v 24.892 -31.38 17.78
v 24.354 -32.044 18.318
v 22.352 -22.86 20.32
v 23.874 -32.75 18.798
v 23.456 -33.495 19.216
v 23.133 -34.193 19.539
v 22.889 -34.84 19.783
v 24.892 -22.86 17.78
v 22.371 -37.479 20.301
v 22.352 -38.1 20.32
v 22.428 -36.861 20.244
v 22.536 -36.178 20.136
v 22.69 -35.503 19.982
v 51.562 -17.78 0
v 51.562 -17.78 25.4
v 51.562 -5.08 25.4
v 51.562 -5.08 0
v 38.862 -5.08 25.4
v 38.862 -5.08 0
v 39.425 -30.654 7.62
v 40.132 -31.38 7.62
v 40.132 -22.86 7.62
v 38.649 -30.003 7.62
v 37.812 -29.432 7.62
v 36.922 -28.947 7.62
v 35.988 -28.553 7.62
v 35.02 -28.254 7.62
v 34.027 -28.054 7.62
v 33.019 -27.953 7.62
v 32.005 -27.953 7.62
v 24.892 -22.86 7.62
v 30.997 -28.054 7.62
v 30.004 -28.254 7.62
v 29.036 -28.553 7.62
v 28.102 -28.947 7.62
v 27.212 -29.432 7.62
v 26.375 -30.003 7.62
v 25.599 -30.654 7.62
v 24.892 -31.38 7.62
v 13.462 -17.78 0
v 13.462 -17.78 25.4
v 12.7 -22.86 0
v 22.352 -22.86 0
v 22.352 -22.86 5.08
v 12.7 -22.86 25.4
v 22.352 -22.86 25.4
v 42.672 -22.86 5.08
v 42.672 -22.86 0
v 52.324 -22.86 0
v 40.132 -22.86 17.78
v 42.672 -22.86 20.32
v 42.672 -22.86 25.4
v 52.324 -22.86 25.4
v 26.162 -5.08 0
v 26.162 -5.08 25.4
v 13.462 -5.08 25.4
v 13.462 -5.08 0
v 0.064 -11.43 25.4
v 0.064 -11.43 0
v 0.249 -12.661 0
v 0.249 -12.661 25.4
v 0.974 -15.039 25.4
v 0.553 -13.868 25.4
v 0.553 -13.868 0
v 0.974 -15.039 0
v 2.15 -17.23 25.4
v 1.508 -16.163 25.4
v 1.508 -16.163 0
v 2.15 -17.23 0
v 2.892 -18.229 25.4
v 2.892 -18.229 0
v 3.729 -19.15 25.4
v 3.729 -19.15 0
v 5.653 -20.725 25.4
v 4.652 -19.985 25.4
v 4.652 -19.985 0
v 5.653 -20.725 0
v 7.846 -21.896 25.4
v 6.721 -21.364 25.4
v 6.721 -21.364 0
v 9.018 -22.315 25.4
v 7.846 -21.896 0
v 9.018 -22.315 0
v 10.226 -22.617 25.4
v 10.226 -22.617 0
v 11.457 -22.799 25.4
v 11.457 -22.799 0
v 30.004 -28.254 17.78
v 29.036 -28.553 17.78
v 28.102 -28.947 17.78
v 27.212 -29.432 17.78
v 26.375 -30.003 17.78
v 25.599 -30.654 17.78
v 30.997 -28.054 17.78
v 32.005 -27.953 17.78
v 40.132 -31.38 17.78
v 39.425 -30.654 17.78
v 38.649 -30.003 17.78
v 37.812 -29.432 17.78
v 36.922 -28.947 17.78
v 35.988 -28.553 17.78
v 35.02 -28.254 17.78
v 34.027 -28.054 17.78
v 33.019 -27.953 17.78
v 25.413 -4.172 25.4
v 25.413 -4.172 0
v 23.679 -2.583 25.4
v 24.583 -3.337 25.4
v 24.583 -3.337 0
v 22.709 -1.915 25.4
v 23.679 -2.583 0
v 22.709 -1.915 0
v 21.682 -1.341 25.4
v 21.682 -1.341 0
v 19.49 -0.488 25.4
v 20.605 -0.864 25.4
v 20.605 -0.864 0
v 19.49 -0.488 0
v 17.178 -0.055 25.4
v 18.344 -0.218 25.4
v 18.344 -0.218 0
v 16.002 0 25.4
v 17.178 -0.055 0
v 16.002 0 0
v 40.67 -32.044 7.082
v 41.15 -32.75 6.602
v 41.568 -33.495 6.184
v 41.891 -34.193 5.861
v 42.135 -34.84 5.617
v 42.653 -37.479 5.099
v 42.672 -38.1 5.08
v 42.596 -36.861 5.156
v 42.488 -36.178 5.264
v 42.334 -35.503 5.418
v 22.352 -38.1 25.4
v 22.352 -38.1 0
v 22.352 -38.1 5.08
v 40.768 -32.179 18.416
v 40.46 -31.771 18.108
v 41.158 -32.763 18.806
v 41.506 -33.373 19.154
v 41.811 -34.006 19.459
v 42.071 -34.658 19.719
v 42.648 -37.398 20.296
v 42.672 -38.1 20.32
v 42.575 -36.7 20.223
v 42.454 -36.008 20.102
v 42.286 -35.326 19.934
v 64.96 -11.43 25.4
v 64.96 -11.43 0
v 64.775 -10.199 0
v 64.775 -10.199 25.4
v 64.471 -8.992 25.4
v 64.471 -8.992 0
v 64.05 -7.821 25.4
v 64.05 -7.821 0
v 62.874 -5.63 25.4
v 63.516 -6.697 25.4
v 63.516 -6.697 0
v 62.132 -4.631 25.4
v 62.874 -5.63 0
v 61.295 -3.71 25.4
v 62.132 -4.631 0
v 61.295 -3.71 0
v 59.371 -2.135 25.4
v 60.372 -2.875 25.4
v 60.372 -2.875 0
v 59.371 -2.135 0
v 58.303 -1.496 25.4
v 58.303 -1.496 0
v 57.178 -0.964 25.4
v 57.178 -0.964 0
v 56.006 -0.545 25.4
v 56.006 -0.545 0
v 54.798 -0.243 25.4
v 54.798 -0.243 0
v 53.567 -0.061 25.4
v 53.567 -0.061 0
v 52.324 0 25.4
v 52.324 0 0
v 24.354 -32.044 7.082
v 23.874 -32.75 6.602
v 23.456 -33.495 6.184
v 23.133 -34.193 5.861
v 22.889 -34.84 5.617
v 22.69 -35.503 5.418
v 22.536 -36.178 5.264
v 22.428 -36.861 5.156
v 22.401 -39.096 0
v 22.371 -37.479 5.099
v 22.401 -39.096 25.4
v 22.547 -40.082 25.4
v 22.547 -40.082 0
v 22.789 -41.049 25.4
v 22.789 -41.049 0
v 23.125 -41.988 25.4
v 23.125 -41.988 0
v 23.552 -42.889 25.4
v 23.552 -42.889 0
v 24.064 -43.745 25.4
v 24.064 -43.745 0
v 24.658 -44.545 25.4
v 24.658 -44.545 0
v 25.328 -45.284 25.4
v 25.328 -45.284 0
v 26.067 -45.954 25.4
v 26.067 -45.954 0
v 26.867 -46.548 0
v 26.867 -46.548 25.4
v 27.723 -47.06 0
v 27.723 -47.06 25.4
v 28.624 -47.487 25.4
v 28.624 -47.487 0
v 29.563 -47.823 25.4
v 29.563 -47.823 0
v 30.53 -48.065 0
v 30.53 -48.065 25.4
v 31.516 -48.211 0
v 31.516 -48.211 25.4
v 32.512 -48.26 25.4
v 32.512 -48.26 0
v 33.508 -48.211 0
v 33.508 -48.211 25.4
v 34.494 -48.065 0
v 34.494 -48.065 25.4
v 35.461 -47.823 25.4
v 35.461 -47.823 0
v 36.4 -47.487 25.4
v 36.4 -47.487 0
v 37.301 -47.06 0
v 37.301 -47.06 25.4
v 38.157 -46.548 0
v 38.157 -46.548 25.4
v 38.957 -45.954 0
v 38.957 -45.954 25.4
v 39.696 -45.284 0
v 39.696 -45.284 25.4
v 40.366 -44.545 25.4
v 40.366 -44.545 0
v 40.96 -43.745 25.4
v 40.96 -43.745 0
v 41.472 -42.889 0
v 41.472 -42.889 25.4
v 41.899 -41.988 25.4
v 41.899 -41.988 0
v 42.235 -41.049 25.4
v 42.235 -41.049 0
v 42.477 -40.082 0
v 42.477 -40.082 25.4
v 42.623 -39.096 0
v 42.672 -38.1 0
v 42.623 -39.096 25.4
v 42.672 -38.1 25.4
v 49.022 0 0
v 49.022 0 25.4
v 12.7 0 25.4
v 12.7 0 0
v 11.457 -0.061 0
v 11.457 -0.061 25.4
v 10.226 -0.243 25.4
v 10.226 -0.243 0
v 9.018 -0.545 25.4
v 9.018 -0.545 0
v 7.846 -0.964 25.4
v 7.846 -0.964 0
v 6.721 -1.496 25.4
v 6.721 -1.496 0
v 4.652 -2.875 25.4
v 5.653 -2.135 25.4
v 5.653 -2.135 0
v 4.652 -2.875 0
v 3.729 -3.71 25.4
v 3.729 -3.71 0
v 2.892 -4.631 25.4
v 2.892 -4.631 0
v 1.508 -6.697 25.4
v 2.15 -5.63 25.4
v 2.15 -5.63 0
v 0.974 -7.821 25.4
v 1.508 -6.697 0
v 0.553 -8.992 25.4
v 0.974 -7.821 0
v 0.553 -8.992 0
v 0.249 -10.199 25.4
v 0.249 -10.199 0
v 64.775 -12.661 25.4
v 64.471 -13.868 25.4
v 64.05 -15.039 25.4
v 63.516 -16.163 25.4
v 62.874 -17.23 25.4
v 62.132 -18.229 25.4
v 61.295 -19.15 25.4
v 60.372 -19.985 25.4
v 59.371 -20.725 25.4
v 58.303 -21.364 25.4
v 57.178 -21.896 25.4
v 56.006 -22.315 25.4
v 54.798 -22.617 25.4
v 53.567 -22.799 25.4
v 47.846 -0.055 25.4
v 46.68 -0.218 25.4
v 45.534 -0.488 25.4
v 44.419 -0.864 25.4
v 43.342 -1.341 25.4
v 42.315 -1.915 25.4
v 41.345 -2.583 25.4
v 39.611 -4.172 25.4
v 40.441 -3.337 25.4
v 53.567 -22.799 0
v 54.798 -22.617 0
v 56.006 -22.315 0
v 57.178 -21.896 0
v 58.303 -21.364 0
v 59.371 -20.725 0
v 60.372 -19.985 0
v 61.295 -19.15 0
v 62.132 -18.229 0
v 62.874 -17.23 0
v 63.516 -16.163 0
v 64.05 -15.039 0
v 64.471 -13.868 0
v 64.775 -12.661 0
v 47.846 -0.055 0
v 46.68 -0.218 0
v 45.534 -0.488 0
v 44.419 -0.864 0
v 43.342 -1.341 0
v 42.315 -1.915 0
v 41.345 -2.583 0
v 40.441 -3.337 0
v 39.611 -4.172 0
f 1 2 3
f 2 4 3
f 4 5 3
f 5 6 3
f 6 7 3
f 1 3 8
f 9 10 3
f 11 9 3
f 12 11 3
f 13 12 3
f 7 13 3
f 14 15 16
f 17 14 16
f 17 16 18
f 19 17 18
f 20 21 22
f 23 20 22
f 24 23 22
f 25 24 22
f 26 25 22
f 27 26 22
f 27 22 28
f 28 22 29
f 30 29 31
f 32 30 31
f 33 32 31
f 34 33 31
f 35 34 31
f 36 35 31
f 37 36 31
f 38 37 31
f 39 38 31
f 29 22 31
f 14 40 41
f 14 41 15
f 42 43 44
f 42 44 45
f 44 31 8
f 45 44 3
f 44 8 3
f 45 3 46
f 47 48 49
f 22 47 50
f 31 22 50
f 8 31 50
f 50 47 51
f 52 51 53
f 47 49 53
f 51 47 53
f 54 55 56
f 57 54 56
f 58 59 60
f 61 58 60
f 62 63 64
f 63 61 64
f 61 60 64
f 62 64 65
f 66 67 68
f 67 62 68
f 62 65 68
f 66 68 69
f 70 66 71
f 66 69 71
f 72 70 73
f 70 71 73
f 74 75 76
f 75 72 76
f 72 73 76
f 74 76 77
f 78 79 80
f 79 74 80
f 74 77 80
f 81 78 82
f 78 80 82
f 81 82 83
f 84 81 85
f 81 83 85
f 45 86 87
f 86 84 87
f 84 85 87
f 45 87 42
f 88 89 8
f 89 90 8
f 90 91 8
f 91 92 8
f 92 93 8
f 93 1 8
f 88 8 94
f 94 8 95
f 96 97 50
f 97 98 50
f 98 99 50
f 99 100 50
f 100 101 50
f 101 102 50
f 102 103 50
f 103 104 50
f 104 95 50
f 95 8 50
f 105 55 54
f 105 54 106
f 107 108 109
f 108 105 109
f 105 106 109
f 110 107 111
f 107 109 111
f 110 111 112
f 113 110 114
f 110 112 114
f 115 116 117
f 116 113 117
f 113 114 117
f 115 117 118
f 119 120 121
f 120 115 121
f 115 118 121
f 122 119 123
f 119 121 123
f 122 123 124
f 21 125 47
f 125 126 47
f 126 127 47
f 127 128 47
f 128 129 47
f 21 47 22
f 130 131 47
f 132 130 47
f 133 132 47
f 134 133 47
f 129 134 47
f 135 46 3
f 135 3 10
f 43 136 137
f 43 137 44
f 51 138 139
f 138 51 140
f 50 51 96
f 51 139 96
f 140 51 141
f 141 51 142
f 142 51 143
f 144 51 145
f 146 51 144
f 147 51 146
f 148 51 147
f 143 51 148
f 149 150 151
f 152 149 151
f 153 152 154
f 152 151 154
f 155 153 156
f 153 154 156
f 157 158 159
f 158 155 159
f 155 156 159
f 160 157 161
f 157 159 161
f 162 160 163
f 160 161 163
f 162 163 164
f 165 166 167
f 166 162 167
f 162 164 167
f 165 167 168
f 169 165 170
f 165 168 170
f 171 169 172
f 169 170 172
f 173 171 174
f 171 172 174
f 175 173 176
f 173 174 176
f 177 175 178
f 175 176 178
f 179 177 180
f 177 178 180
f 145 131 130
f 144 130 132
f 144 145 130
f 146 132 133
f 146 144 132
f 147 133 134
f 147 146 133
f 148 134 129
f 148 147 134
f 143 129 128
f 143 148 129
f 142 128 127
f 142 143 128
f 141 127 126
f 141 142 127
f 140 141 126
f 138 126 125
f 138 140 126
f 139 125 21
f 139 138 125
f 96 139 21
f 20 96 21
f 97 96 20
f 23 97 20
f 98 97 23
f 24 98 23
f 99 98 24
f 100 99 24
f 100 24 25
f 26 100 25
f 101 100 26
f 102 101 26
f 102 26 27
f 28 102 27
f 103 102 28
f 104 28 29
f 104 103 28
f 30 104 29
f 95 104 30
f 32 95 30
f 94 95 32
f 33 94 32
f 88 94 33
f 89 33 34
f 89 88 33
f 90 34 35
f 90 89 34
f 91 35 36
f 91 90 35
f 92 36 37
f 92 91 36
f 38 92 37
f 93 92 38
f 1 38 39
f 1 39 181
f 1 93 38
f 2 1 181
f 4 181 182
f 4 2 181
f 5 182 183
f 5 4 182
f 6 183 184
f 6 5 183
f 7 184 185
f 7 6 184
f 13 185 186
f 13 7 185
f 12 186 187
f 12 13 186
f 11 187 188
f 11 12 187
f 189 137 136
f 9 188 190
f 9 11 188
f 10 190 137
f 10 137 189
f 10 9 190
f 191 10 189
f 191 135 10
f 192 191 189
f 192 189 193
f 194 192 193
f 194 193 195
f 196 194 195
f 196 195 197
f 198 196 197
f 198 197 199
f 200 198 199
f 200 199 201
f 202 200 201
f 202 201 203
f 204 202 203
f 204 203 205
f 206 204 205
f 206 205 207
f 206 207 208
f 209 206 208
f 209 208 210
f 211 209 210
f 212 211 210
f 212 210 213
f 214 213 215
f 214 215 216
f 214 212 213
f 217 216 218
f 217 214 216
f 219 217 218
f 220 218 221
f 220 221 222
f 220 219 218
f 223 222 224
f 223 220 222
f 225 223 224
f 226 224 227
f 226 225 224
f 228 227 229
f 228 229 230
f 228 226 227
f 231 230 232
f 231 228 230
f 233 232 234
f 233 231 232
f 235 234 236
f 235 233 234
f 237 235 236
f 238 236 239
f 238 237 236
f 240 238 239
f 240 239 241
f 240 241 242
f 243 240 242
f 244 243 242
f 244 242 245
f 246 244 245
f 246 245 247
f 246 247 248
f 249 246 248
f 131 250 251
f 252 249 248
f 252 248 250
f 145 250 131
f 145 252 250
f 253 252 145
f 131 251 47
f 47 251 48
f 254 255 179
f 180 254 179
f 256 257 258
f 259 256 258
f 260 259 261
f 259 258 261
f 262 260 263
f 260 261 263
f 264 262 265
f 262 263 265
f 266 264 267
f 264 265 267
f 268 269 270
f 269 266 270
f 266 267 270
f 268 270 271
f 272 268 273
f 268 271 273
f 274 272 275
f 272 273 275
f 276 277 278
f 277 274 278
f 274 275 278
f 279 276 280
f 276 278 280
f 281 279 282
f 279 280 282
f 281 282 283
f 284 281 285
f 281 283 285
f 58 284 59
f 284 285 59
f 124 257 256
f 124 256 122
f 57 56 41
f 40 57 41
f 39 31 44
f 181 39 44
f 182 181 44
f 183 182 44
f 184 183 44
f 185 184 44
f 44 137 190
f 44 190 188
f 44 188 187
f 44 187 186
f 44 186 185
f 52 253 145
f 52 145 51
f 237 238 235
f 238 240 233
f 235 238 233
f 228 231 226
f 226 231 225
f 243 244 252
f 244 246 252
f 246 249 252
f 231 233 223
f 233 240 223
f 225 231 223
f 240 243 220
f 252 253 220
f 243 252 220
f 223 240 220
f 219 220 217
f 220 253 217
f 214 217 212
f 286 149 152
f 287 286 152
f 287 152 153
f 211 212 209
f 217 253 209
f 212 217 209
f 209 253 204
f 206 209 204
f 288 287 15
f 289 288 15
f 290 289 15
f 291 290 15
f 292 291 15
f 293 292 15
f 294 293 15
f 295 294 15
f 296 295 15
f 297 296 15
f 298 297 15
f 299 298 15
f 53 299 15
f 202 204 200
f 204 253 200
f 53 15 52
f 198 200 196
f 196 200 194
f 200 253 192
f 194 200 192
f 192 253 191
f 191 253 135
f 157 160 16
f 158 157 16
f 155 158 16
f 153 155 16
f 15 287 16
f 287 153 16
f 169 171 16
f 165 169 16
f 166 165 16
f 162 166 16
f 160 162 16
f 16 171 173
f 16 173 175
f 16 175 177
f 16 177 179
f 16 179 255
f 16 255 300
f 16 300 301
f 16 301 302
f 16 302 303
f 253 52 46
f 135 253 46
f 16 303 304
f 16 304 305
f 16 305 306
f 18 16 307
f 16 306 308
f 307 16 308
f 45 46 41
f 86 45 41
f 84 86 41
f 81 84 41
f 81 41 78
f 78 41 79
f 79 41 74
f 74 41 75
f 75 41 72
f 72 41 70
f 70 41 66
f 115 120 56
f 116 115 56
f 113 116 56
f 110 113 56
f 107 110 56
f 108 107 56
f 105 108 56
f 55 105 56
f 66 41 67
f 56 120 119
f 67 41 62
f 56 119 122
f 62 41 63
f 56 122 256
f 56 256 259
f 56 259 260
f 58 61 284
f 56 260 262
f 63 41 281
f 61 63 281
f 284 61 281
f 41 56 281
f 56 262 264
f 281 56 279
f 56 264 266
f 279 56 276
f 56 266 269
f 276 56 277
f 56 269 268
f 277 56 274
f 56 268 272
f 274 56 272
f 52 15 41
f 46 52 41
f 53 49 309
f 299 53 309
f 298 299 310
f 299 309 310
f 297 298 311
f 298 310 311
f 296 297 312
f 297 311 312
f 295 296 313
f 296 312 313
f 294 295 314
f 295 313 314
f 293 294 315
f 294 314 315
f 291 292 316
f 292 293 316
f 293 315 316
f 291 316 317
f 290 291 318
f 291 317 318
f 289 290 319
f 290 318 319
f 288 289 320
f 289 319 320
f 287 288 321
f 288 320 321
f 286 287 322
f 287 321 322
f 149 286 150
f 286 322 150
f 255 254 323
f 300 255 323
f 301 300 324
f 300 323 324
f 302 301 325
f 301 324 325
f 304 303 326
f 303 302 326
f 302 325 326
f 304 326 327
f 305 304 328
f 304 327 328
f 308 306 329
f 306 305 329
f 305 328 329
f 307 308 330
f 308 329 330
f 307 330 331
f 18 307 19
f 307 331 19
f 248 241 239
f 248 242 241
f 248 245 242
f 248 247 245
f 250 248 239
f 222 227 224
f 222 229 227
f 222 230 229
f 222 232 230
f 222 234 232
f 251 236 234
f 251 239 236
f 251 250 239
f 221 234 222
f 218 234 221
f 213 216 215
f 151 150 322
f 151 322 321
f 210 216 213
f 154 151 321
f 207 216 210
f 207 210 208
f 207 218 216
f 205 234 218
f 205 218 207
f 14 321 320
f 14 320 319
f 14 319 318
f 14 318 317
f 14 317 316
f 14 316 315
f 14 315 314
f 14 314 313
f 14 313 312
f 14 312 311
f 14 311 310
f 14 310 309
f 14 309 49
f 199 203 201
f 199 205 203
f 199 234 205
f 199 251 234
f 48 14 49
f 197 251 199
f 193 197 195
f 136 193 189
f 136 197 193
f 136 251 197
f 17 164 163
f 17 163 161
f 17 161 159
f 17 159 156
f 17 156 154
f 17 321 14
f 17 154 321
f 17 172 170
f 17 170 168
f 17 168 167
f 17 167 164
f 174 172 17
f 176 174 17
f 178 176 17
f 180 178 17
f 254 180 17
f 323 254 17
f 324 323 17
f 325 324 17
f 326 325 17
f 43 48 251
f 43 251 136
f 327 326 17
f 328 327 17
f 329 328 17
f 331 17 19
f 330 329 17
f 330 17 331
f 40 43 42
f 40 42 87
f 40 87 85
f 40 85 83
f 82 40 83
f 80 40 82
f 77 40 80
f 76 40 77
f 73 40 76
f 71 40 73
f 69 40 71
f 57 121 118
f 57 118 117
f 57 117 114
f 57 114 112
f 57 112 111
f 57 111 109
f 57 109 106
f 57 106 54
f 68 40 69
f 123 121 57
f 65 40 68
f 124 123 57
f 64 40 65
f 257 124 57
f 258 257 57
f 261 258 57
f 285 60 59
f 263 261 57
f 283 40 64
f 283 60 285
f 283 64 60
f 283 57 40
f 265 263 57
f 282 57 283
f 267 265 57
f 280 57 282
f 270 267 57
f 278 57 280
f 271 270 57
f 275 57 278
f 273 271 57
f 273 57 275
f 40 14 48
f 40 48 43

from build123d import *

# Parameters (mm, degrees)
BOSS_EXTRUDE2_DEPTH = 25.4
BOSS_EXTRUDE3_DEPTH = 7.62
SKETCH6_R           = 10.16
BOSS_EXTRUDE5_DEPTH = 25.4
FILLET4_R           = 12.7
CHAMFER3_SIZE       = 2.54
SKETCH7_W           = 20.32
SKETCH7_H           = 15.24
BOSS_EXTRUDE6_DEPTH = 7.62
CHAMFER4_SIZE       = 2.54


with BuildPart() as part:
    # Sketch2 → Boss-Extrude2 (new body)
    with BuildSketch(Plane.XY):
        Polygon((0, 0), (26.162, 0), (26.162, -5.08), (13.462, -5.08), (13.462, -17.78), (51.562, -17.78), (51.562, -5.08), (38.862, -5.08), (38.862, 0), (65.024, 0), (65.024, -22.86), (0, -22.86), align=None)
    extrude(amount=BOSS_EXTRUDE2_DEPTH)

    # Sketch4 → Boss-Extrude3 (add)
    with BuildSketch(Plane.XY.offset(25.4)):
        Polygon((32.512, -22.86), (22.352, -22.86), (22.352, -38.1), (42.672, -38.1), (42.672, -22.86), align=None)
    extrude(amount=-BOSS_EXTRUDE3_DEPTH)

    # Sketch6 → Boss-Extrude5 (add)
    with BuildSketch(Plane.XY.offset(25.4)):
        with Locations((32.512, -38.1)):
            Circle(SKETCH6_R)
    extrude(amount=-BOSS_EXTRUDE5_DEPTH)

    # Fillet4
    # the kernel refuses this fillet: 12.7 mm, written as the material it takes off along each edge
    with BuildSketch(Plane(origin=(65.024, -22.86, -31.75), x_dir=(-1, 0, 0), z_dir=(0, 0, 1)), Plane(origin=(0, -22.86, -31.75), x_dir=(0, 1, 0), z_dir=(0, 0, 1)), Plane(origin=(0, 0, -31.75), x_dir=(1, 0, 0), z_dir=(0, 0, 1))) as fillet4_piece_1:
        with BuildLine():
            CenterArc((FILLET4_R, -FILLET4_R), FILLET4_R, 90, 90)
            Line((0, -FILLET4_R), (-FILLET4_R * 0.02, -FILLET4_R))
            Line((-FILLET4_R * 0.02, -FILLET4_R), (-FILLET4_R * 0.02, FILLET4_R * 0.02))
            Line((-FILLET4_R * 0.02, FILLET4_R * 0.02), (FILLET4_R, FILLET4_R * 0.02))
            Line((FILLET4_R, FILLET4_R * 0.02), (FILLET4_R, 0))
        make_face()
    extrude(amount=88.9, mode=Mode.SUBTRACT)
    with BuildSketch(Plane(origin=(26.162, 0, -25.4), x_dir=(-1, 0, 0), z_dir=(0, 0, 1))) as fillet4_piece_2:
        with BuildLine():
            CenterArc((10.16, 12.7), FILLET4_R, 216.869897646, 53.130102354)
            Line((0, 5.08), (-0.2032, 4.9276))
            ThreePointArc((-0.2032, 4.9276), (-0.254, 2.54), (-0.254, 0))
            Line((-0.254, 0), (0, -0.254))
            Line((0, -0.254), (10.16, -0.254))
            Line((10.16, -0.254), (10.16, 0))
        make_face()
    extrude(amount=76.2, mode=Mode.SUBTRACT)
    with BuildSketch(Plane(origin=(38.862, 0, -25.4), x_dir=(0, -1, 0), z_dir=(0, 0, 1))) as fillet4_piece_3:
        with BuildLine():
            CenterArc((12.7, 10.16), FILLET4_R, 180, 53.130102354)
            Line((0, 10.16), (-0.254, 10.16))
            Line((-0.254, 10.16), (-0.254, 0))
            Line((-0.254, 0), (0, -0.254))
            ThreePointArc((0, -0.254), (2.54, -0.254), (4.9276, -0.2032))
            Line((4.9276, -0.2032), (5.08, 0))
        make_face()
    extrude(amount=76.2, mode=Mode.SUBTRACT)
    with BuildSketch(Plane(origin=(65.024, 0, -31.75), x_dir=(-1, 0, 0), z_dir=(0, 0, 1))) as fillet4_piece_4:
        with BuildLine():
            CenterArc((FILLET4_R, FILLET4_R), FILLET4_R, 180, 90)
            Line((0, FILLET4_R), (-FILLET4_R * 0.02, FILLET4_R))
            Line((-FILLET4_R * 0.02, FILLET4_R), (-FILLET4_R * 0.02, -FILLET4_R * 0.02))
            Line((-FILLET4_R * 0.02, -FILLET4_R * 0.02), (FILLET4_R, -FILLET4_R * 0.02))
            Line((FILLET4_R, -FILLET4_R * 0.02), (FILLET4_R, 0))
        make_face()
    extrude(amount=88.9, mode=Mode.SUBTRACT)

    # Chamfer3
    # the kernel refuses this chamfer: 2.54 mm, written as the material it takes off along each edge
    with BuildSketch(Plane(origin=(42.672, -44.632074789, 17.78), x_dir=(0.027495876610587302, 0, 0.9996219169112966), z_dir=(0, 1, 0))) as chamfer3_piece_1_section:
        Polygon((CHAMFER3_SIZE * 0.999621916911, -CHAMFER3_SIZE * 0.0274958766106), (-CHAMFER3_SIZE * 0.0274958766106, -CHAMFER3_SIZE * 0.999621916911), (0, 0), align=None)
    chamfer3_piece_1 = extrude(amount=21.772074789, mode=Mode.PRIVATE)
    chamfer3_piece_1 = chamfer3_piece_1 - Plane(origin=(32.512, -38.1, 18.664342035), x_dir=(1, 0, 0), z_dir=(0, 0, 1)) * Cylinder(10.16, 54, mode=Mode.PRIVATE)
    add(chamfer3_piece_1, mode=Mode.SUBTRACT)
    with BuildSketch(Plane(origin=(22.352, -22.86, 17.78), x_dir=(-0.02749587661058595, 0, 0.9996219169112968), z_dir=(0, -1, 0))) as chamfer3_piece_2_section:
        Polygon((CHAMFER3_SIZE * 0.999621916911, -CHAMFER3_SIZE * 0.0274958766106), (-CHAMFER3_SIZE * 0.0274958766106, -CHAMFER3_SIZE * 0.999621916911), (0, 0), align=None)
    chamfer3_piece_2 = extrude(amount=21.772074789, mode=Mode.PRIVATE)
    chamfer3_piece_2 = chamfer3_piece_2 - Plane(origin=(32.512, -38.1, 18.664342036), x_dir=(1, 0, 0), z_dir=(0, 0, 1)) * Cylinder(10.16, 54, mode=Mode.PRIVATE)
    add(chamfer3_piece_2, mode=Mode.SUBTRACT)

    # Sketch7 → Boss-Extrude6 (add)
    with BuildSketch(Plane(origin=(0, 0, 0), x_dir=(-1, 0, 0), z_dir=(0, 0, -1))):
        with Locations((-32.512, -30.48)):
            Rectangle(SKETCH7_W, SKETCH7_H)
    extrude(amount=-BOSS_EXTRUDE6_DEPTH)

    # Chamfer4
    # the kernel refuses this chamfer: 2.54 mm, written as the material it takes off along each edge
    with BuildSketch(Plane(origin=(22.352, -44.632074789, 7.62), x_dir=(0.9996219169112966, 0, 0.027495876610586282), z_dir=(0, 1, 0))) as chamfer4_piece_1_section:
        Polygon((CHAMFER4_SIZE * 0.999621916911, CHAMFER4_SIZE * 0.0274958766106), (-CHAMFER4_SIZE * 0.0274958766106, CHAMFER4_SIZE * 0.999621916911), (0, 0), align=None)
    chamfer4_piece_1 = extrude(amount=21.772074789, mode=Mode.PRIVATE)
    chamfer4_piece_1 = chamfer4_piece_1 - Plane(origin=(32.512, -38.1, 6.735657964), x_dir=(1, 0, 0), z_dir=(0, 0, 1)) * Cylinder(10.16, 54, mode=Mode.PRIVATE)
    add(chamfer4_piece_1, mode=Mode.SUBTRACT)
    with BuildSketch(Plane(origin=(42.672, -22.86, 7.62), x_dir=(0.027495876610587288, 0, -0.9996219169112968), z_dir=(0, -1, 0))) as chamfer4_piece_2_section:
        Polygon((CHAMFER4_SIZE * 0.999621916911, -CHAMFER4_SIZE * 0.0274958766106), (-CHAMFER4_SIZE * 0.0274958766106, -CHAMFER4_SIZE * 0.999621916911), (0, 0), align=None)
    chamfer4_piece_2 = extrude(amount=21.772074789, mode=Mode.PRIVATE)
    chamfer4_piece_2 = chamfer4_piece_2 - Plane(origin=(32.512, -38.1, 6.735657965), x_dir=(1, 0, 0), z_dir=(0, 0, 1)) * Cylinder(10.16, 54, mode=Mode.PRIVATE)
    add(chamfer4_piece_2, mode=Mode.SUBTRACT)


solid = part.part
